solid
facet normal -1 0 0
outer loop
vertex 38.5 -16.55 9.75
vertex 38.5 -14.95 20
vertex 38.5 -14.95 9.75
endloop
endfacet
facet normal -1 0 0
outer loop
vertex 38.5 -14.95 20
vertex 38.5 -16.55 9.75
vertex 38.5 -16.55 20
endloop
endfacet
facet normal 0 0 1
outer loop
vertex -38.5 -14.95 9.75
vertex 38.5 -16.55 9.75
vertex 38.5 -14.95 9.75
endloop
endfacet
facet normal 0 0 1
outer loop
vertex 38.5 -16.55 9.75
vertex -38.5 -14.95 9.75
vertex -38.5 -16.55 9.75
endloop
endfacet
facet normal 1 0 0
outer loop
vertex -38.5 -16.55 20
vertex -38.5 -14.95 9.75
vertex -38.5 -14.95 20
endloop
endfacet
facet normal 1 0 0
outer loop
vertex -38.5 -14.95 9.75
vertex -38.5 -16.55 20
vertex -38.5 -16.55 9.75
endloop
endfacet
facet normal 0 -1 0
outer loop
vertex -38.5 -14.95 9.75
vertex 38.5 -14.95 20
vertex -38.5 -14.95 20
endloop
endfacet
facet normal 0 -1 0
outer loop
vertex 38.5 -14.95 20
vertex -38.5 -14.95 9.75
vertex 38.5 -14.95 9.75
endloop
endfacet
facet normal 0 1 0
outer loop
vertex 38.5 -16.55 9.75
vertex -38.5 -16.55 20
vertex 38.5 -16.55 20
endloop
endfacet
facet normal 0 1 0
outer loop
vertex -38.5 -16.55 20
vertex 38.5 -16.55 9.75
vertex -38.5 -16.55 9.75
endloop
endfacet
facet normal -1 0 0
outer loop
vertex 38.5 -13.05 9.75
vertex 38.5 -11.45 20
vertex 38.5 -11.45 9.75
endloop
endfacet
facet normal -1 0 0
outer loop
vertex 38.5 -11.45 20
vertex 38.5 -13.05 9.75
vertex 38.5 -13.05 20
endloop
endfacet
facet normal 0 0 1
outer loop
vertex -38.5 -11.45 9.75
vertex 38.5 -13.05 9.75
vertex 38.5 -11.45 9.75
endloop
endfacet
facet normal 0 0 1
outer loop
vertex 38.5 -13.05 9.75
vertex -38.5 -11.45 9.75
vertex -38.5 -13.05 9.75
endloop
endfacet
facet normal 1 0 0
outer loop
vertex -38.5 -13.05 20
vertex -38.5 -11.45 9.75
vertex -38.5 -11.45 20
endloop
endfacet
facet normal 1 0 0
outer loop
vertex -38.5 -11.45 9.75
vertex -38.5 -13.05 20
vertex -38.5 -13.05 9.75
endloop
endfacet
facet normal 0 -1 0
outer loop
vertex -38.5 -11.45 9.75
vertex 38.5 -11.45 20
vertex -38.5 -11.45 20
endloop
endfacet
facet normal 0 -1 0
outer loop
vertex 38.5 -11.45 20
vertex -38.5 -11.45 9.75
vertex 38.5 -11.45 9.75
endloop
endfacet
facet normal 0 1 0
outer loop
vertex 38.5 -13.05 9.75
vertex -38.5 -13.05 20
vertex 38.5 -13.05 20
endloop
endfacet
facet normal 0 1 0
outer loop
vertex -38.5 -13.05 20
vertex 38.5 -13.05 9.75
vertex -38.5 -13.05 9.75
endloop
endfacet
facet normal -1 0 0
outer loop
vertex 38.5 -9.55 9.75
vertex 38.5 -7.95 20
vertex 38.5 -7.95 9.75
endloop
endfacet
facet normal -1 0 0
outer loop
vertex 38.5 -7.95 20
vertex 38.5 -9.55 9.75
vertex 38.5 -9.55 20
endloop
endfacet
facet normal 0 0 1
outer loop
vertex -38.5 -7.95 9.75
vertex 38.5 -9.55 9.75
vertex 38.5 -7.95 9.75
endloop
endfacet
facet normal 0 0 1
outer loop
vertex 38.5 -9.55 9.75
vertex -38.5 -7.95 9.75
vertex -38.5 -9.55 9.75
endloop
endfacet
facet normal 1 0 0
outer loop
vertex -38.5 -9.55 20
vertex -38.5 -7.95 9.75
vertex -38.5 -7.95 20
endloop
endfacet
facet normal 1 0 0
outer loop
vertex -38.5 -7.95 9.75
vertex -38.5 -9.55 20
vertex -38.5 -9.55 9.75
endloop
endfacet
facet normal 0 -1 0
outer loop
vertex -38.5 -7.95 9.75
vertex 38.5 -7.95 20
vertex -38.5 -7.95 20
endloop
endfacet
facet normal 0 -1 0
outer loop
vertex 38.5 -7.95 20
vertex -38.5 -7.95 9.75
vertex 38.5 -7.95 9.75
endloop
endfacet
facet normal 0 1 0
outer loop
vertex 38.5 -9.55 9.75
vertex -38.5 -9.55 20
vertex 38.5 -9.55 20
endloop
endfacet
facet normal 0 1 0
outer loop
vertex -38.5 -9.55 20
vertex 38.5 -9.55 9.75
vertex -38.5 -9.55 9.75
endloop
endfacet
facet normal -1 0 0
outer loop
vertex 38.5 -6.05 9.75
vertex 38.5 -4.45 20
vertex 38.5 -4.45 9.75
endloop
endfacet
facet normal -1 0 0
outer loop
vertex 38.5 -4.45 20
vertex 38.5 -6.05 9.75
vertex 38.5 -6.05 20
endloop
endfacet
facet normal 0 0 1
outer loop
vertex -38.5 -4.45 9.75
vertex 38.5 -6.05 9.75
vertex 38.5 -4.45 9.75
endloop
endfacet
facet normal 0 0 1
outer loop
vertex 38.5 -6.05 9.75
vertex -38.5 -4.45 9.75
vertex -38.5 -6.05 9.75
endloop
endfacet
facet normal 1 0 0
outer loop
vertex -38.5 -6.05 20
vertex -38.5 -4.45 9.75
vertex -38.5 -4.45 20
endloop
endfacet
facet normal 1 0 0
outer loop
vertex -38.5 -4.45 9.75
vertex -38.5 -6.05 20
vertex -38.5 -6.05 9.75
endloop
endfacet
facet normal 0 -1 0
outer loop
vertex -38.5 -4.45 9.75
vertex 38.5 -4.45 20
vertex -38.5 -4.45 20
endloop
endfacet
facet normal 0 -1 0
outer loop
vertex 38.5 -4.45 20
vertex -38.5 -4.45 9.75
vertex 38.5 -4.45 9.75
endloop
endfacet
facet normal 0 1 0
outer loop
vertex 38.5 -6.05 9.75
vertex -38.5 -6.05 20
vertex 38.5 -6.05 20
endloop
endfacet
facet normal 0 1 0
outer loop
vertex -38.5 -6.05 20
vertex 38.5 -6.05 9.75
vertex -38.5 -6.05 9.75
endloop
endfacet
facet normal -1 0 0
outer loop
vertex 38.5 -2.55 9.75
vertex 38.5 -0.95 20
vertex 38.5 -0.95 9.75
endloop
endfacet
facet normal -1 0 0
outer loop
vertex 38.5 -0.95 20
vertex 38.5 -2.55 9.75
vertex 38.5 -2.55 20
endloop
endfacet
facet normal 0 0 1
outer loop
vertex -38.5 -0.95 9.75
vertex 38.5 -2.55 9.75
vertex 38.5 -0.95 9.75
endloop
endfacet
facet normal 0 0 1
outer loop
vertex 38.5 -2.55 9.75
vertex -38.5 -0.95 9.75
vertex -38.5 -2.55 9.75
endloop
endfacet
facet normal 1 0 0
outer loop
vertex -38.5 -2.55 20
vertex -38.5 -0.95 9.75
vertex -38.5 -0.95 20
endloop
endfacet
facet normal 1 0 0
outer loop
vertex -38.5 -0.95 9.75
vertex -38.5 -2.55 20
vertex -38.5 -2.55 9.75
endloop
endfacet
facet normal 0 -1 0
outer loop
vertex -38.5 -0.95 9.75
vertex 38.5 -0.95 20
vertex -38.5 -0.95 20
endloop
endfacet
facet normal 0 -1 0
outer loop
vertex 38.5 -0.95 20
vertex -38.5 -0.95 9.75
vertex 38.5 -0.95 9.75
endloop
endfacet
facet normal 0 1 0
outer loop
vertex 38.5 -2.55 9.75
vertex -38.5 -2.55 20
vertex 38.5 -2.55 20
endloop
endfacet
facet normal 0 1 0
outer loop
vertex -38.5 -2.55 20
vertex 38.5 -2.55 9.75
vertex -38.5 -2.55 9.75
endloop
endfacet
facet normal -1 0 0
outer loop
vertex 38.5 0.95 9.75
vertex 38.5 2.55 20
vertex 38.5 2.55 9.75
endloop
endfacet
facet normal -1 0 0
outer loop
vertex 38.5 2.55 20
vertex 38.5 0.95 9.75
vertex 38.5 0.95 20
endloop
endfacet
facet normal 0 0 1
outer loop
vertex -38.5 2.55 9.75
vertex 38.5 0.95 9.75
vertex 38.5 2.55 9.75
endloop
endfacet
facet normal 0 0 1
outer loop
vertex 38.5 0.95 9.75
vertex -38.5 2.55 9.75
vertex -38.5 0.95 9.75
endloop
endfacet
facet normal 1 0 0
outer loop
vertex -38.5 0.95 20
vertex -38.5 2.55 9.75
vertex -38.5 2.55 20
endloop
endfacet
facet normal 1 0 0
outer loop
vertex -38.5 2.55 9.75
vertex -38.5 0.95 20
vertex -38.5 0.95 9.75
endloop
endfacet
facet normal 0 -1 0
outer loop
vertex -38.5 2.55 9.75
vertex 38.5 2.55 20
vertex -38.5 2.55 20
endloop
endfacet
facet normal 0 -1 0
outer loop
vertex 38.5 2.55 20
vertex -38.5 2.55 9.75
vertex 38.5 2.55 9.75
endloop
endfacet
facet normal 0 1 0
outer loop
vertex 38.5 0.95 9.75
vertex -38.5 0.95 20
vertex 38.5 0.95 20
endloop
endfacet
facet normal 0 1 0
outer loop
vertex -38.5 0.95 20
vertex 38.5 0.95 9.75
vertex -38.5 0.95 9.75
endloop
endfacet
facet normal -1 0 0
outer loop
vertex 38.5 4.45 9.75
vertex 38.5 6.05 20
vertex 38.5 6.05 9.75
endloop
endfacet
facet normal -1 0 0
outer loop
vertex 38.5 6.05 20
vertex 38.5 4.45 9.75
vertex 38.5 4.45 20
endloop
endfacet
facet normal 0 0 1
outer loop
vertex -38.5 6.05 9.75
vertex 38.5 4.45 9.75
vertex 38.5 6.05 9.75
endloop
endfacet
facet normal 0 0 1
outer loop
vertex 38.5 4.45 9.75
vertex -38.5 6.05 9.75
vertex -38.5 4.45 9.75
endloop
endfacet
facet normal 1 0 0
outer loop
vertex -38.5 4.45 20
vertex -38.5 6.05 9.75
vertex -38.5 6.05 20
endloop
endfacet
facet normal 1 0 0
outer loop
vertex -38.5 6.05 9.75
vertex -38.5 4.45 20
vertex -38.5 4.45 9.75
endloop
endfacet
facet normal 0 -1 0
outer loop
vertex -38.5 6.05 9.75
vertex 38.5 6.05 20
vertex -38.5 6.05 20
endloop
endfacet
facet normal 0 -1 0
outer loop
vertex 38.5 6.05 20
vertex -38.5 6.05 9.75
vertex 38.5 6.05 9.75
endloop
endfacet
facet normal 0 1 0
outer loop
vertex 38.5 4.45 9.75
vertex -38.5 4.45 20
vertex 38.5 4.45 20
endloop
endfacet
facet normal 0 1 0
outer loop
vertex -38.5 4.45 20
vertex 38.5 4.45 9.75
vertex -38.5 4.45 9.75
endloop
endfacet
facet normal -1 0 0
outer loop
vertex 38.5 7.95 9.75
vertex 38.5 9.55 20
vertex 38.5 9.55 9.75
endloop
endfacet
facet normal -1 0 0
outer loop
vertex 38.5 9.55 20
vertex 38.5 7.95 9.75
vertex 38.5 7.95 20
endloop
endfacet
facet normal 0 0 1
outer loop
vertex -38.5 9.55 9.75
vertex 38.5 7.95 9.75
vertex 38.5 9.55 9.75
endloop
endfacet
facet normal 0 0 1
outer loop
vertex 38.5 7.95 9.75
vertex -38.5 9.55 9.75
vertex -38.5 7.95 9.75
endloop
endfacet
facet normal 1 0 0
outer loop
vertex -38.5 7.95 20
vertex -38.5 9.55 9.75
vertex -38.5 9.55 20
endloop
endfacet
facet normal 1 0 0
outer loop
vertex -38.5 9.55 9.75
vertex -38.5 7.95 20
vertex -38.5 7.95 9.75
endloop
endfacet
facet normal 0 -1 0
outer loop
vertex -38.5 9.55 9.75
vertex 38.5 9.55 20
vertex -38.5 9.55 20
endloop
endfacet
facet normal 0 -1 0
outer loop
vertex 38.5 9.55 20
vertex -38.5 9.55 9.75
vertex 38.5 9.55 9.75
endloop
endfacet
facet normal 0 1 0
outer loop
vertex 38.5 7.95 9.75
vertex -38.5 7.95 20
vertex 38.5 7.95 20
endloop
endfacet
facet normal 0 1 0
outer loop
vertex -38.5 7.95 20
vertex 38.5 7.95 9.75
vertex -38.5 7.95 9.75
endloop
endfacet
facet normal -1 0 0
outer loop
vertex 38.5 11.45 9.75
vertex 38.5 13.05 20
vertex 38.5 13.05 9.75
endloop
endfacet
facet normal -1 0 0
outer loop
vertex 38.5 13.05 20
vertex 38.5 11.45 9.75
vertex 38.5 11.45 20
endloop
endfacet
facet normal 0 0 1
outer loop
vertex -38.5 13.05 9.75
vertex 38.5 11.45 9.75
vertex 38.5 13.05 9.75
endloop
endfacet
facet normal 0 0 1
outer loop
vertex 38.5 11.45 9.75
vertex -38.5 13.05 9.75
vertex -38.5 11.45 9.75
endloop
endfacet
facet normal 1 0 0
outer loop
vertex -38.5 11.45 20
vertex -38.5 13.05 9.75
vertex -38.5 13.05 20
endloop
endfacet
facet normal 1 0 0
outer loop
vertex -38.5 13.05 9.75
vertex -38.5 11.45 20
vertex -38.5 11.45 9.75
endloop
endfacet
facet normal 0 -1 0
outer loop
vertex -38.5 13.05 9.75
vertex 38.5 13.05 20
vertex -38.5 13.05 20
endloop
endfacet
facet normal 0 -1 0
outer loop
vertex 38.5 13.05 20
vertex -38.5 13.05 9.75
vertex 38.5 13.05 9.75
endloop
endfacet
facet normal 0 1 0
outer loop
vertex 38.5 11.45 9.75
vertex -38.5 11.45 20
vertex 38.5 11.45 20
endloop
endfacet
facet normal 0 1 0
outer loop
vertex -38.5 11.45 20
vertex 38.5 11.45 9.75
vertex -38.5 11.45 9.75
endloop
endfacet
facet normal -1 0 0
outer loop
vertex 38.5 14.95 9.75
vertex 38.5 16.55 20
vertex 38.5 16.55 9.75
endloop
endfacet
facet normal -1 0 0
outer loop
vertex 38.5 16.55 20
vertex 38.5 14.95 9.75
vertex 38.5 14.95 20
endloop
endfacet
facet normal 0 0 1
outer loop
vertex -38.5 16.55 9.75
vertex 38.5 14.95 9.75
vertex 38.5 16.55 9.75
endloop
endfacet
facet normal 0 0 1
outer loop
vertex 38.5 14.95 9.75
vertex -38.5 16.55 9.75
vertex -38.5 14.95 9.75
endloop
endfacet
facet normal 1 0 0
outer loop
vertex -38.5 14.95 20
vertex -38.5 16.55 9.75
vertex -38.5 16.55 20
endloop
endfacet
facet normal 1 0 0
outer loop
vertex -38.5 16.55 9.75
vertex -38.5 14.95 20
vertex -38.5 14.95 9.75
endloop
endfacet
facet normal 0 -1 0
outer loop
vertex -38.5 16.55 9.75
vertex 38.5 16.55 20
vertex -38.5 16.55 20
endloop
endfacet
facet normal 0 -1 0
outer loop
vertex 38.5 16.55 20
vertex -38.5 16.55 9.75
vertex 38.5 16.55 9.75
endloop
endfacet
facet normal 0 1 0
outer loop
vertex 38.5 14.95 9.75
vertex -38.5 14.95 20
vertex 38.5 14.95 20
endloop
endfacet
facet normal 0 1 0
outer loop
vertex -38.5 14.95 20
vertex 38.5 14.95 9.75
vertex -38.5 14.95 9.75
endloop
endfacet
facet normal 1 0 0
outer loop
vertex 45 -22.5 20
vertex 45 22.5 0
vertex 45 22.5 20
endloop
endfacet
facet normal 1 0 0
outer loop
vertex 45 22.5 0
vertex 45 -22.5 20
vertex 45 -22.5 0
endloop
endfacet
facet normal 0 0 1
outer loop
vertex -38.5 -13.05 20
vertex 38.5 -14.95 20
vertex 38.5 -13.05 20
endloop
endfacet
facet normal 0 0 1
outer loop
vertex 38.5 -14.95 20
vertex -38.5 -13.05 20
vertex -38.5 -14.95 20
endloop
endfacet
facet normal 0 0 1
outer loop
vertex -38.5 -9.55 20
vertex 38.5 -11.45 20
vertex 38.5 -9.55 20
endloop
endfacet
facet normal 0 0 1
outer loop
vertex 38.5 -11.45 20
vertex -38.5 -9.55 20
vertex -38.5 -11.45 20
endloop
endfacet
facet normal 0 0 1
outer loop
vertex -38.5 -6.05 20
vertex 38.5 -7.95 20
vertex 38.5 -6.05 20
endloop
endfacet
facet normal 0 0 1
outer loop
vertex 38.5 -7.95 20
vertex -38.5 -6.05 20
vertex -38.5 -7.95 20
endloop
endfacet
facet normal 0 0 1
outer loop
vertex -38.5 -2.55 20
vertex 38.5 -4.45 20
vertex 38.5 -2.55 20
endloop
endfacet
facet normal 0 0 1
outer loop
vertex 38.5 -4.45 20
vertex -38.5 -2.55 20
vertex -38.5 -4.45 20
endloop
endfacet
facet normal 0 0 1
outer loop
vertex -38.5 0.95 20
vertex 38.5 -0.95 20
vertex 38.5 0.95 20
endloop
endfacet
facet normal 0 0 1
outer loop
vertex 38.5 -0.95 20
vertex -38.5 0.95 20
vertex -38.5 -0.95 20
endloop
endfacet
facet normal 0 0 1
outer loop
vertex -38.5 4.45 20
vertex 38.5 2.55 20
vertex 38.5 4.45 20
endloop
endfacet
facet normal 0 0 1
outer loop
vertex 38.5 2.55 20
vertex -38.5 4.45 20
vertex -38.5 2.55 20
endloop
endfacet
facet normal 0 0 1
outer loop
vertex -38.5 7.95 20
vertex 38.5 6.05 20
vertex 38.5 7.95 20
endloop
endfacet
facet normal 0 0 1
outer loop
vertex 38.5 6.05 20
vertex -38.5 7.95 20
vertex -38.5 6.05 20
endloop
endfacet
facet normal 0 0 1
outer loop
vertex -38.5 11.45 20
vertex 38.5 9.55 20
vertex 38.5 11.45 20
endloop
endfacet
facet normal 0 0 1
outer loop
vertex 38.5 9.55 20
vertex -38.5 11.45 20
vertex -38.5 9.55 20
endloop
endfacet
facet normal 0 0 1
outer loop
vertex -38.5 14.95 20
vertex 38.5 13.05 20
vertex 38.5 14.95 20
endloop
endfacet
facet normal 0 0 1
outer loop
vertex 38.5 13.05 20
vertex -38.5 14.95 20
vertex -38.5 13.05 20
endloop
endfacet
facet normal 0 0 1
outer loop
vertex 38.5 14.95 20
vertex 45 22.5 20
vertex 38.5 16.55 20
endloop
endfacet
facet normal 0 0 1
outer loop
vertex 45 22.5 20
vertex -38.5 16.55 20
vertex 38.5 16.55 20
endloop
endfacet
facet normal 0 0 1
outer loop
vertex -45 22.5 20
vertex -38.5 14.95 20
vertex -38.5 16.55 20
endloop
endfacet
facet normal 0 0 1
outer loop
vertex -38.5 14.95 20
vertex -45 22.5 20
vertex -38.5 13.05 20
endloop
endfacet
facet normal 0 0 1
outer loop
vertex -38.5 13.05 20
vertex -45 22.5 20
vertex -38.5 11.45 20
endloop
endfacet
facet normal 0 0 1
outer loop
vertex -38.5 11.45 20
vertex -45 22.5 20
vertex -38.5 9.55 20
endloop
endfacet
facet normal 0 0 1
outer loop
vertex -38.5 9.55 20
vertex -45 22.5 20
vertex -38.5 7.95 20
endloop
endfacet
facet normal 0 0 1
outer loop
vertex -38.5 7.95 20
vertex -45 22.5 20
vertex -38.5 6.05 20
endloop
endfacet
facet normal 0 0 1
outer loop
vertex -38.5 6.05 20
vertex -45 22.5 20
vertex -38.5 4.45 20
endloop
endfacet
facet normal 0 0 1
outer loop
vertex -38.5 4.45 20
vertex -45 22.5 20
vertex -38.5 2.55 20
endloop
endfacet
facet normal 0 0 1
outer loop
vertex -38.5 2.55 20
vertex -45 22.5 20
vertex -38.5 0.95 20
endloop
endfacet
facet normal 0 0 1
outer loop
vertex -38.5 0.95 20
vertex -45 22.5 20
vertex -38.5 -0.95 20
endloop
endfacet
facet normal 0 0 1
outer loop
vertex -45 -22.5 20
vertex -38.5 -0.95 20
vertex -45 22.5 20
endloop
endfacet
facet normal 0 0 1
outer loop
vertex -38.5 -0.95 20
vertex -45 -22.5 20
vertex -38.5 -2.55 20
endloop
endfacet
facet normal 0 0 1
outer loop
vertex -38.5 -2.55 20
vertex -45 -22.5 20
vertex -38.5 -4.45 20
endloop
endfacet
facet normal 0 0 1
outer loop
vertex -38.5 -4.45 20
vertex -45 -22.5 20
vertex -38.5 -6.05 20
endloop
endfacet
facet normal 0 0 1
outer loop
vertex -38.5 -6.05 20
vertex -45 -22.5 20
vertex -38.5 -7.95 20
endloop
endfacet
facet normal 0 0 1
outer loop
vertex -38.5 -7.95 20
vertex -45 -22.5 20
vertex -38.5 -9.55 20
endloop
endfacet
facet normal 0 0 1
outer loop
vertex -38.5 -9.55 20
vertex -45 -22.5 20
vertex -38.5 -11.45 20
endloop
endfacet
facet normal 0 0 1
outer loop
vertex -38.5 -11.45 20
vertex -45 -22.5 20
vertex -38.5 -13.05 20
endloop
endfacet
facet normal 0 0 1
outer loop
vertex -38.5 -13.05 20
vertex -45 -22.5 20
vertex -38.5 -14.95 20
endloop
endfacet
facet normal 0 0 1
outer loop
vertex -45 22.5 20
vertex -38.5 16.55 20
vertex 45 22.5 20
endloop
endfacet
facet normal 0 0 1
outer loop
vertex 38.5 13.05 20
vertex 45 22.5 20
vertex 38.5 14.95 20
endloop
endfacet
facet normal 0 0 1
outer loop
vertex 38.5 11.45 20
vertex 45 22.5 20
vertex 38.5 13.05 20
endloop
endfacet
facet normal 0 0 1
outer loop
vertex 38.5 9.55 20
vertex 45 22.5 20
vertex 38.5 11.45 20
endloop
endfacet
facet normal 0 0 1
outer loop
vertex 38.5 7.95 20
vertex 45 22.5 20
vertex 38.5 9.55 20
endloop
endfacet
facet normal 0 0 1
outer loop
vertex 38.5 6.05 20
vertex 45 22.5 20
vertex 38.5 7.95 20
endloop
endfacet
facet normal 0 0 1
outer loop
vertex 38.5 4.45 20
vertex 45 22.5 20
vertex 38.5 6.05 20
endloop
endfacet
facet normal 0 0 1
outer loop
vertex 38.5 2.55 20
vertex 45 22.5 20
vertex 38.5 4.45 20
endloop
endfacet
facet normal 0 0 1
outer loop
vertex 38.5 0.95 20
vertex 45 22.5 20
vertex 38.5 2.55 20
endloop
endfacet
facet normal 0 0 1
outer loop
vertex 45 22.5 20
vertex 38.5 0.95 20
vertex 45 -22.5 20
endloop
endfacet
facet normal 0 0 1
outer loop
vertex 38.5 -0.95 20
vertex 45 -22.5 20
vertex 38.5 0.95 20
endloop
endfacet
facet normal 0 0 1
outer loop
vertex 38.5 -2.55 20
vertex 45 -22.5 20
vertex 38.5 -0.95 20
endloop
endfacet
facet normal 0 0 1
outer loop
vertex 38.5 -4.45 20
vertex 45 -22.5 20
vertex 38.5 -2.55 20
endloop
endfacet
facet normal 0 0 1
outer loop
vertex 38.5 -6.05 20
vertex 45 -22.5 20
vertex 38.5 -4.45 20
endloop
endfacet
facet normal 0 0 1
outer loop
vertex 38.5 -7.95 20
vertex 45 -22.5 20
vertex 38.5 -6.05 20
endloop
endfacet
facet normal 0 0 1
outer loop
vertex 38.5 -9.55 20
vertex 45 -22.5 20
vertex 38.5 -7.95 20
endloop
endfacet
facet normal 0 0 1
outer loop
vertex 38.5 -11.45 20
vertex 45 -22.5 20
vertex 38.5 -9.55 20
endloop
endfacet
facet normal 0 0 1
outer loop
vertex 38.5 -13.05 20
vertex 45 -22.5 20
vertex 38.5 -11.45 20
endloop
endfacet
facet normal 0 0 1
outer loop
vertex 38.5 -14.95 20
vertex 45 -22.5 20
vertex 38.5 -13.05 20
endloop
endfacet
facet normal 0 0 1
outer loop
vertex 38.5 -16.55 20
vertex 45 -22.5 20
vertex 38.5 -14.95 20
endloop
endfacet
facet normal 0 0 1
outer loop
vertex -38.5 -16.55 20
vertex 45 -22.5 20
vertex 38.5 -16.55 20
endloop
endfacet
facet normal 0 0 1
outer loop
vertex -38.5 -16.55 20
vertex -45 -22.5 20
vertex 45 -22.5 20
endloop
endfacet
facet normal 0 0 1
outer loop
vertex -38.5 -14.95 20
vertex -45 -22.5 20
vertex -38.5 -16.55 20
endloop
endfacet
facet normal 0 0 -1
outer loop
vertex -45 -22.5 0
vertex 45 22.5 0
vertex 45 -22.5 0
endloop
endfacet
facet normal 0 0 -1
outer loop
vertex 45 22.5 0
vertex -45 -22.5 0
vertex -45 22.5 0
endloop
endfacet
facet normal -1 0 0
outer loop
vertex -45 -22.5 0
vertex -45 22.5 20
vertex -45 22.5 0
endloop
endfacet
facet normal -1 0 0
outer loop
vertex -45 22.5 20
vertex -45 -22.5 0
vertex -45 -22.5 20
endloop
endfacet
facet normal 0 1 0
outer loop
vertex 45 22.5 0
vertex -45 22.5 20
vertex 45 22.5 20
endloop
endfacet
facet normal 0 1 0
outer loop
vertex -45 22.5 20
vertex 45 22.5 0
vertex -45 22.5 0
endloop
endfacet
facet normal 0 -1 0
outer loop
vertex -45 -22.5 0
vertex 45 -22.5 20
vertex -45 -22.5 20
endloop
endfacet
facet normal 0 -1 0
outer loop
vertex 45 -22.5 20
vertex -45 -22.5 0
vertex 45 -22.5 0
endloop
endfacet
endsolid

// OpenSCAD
// Microscope slide holder - holds 10 slides (75x25x1 mm) standing vertically
// Base block dimensions
block_length_x = 90;    // Length in X direction (mm)
block_width_y = 45;     // Width in Y direction (mm)
block_height_z = 20;    // Height in Z direction (mm)

// Groove dimensions
groove_length_x = 77;   // Groove length along X (mm)
groove_width_y = 1.6;   // Groove width in Y direction (mm)
groove_depth_z = 10;    // Groove depth in Z direction (mm)

// Groove array parameters
num_grooves = 10;       // Number of grooves
groove_spacing_y = 3.5; // Center-to-center spacing in Y (mm)

// Calculate groove positions to center the array
total_groove_span_y = (num_grooves - 1) * groove_spacing_y;
groove_start_y = -total_groove_span_y / 2;

$fn = 64;

difference() {
    // Solid base block, centered in X and Y, resting on XY plane at z=0
    translate([0, 0, block_height_z/2]) {
        cube([block_length_x, block_width_y, block_height_z], center = true);
    }
    
    // Cut 10 parallel grooves on top surface
    for (i = [0:num_grooves-1]) {
        groove_y = groove_start_y + i * groove_spacing_y;
        
        // Each groove: centered in X, positioned in Y, from top down
        // Opens at top, extends to 10 mm depth
        translate([0, groove_y, block_height_z - groove_depth_z/2]) {
            cube([groove_length_x, groove_width_y, groove_depth_z + 0.5], center = true);
        }
    }
}
